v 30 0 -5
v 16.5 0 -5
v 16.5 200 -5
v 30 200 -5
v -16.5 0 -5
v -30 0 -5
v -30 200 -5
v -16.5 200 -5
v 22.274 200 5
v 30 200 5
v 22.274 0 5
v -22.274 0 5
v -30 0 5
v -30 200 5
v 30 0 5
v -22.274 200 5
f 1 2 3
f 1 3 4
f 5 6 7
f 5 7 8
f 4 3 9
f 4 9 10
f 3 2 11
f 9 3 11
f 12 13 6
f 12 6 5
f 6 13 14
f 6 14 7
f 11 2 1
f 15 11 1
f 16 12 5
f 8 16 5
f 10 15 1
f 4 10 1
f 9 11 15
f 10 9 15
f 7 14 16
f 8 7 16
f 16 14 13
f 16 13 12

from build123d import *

# Parameters (mm, degrees)
SKETCH_1_W          = 60
SKETCH_1_H          = 10
EXTRUDE_1_DEPTH     = 200
CUT_EXTRUDE_1_REACH = 202


with BuildPart() as part:
    # 草图1 → 凸台-拉伸1 (new body)
    with BuildSketch(Plane(origin=(0, 0, 0), x_dir=(1, 0, 0), z_dir=(0, 1, 0))):
        Rectangle(SKETCH_1_W, SKETCH_1_H)
    extrude(amount=EXTRUDE_1_DEPTH)

    # 草图2 → 切除-拉伸1 (cut, up to next)
    with BuildSketch(Plane(origin=(0, 200, 0), x_dir=(1, 0, 0), z_dir=(0, 1, 0)), mode=Mode.PRIVATE) as cut_extrude_1_sk1:
        Polygon((-22.273502692, -5), (-16.5, 5), (16.5, 5), (22.273502692, -5), align=None)
    cut_extrude_1_tool1 = extrude(cut_extrude_1_sk1.sketch, amount=-CUT_EXTRUDE_1_REACH, mode=Mode.PRIVATE) & part.part
    add(cut_extrude_1_tool1.solids().sort_by_distance((0, 200, 0.248172))[0], mode=Mode.SUBTRACT)


solid = part.part
